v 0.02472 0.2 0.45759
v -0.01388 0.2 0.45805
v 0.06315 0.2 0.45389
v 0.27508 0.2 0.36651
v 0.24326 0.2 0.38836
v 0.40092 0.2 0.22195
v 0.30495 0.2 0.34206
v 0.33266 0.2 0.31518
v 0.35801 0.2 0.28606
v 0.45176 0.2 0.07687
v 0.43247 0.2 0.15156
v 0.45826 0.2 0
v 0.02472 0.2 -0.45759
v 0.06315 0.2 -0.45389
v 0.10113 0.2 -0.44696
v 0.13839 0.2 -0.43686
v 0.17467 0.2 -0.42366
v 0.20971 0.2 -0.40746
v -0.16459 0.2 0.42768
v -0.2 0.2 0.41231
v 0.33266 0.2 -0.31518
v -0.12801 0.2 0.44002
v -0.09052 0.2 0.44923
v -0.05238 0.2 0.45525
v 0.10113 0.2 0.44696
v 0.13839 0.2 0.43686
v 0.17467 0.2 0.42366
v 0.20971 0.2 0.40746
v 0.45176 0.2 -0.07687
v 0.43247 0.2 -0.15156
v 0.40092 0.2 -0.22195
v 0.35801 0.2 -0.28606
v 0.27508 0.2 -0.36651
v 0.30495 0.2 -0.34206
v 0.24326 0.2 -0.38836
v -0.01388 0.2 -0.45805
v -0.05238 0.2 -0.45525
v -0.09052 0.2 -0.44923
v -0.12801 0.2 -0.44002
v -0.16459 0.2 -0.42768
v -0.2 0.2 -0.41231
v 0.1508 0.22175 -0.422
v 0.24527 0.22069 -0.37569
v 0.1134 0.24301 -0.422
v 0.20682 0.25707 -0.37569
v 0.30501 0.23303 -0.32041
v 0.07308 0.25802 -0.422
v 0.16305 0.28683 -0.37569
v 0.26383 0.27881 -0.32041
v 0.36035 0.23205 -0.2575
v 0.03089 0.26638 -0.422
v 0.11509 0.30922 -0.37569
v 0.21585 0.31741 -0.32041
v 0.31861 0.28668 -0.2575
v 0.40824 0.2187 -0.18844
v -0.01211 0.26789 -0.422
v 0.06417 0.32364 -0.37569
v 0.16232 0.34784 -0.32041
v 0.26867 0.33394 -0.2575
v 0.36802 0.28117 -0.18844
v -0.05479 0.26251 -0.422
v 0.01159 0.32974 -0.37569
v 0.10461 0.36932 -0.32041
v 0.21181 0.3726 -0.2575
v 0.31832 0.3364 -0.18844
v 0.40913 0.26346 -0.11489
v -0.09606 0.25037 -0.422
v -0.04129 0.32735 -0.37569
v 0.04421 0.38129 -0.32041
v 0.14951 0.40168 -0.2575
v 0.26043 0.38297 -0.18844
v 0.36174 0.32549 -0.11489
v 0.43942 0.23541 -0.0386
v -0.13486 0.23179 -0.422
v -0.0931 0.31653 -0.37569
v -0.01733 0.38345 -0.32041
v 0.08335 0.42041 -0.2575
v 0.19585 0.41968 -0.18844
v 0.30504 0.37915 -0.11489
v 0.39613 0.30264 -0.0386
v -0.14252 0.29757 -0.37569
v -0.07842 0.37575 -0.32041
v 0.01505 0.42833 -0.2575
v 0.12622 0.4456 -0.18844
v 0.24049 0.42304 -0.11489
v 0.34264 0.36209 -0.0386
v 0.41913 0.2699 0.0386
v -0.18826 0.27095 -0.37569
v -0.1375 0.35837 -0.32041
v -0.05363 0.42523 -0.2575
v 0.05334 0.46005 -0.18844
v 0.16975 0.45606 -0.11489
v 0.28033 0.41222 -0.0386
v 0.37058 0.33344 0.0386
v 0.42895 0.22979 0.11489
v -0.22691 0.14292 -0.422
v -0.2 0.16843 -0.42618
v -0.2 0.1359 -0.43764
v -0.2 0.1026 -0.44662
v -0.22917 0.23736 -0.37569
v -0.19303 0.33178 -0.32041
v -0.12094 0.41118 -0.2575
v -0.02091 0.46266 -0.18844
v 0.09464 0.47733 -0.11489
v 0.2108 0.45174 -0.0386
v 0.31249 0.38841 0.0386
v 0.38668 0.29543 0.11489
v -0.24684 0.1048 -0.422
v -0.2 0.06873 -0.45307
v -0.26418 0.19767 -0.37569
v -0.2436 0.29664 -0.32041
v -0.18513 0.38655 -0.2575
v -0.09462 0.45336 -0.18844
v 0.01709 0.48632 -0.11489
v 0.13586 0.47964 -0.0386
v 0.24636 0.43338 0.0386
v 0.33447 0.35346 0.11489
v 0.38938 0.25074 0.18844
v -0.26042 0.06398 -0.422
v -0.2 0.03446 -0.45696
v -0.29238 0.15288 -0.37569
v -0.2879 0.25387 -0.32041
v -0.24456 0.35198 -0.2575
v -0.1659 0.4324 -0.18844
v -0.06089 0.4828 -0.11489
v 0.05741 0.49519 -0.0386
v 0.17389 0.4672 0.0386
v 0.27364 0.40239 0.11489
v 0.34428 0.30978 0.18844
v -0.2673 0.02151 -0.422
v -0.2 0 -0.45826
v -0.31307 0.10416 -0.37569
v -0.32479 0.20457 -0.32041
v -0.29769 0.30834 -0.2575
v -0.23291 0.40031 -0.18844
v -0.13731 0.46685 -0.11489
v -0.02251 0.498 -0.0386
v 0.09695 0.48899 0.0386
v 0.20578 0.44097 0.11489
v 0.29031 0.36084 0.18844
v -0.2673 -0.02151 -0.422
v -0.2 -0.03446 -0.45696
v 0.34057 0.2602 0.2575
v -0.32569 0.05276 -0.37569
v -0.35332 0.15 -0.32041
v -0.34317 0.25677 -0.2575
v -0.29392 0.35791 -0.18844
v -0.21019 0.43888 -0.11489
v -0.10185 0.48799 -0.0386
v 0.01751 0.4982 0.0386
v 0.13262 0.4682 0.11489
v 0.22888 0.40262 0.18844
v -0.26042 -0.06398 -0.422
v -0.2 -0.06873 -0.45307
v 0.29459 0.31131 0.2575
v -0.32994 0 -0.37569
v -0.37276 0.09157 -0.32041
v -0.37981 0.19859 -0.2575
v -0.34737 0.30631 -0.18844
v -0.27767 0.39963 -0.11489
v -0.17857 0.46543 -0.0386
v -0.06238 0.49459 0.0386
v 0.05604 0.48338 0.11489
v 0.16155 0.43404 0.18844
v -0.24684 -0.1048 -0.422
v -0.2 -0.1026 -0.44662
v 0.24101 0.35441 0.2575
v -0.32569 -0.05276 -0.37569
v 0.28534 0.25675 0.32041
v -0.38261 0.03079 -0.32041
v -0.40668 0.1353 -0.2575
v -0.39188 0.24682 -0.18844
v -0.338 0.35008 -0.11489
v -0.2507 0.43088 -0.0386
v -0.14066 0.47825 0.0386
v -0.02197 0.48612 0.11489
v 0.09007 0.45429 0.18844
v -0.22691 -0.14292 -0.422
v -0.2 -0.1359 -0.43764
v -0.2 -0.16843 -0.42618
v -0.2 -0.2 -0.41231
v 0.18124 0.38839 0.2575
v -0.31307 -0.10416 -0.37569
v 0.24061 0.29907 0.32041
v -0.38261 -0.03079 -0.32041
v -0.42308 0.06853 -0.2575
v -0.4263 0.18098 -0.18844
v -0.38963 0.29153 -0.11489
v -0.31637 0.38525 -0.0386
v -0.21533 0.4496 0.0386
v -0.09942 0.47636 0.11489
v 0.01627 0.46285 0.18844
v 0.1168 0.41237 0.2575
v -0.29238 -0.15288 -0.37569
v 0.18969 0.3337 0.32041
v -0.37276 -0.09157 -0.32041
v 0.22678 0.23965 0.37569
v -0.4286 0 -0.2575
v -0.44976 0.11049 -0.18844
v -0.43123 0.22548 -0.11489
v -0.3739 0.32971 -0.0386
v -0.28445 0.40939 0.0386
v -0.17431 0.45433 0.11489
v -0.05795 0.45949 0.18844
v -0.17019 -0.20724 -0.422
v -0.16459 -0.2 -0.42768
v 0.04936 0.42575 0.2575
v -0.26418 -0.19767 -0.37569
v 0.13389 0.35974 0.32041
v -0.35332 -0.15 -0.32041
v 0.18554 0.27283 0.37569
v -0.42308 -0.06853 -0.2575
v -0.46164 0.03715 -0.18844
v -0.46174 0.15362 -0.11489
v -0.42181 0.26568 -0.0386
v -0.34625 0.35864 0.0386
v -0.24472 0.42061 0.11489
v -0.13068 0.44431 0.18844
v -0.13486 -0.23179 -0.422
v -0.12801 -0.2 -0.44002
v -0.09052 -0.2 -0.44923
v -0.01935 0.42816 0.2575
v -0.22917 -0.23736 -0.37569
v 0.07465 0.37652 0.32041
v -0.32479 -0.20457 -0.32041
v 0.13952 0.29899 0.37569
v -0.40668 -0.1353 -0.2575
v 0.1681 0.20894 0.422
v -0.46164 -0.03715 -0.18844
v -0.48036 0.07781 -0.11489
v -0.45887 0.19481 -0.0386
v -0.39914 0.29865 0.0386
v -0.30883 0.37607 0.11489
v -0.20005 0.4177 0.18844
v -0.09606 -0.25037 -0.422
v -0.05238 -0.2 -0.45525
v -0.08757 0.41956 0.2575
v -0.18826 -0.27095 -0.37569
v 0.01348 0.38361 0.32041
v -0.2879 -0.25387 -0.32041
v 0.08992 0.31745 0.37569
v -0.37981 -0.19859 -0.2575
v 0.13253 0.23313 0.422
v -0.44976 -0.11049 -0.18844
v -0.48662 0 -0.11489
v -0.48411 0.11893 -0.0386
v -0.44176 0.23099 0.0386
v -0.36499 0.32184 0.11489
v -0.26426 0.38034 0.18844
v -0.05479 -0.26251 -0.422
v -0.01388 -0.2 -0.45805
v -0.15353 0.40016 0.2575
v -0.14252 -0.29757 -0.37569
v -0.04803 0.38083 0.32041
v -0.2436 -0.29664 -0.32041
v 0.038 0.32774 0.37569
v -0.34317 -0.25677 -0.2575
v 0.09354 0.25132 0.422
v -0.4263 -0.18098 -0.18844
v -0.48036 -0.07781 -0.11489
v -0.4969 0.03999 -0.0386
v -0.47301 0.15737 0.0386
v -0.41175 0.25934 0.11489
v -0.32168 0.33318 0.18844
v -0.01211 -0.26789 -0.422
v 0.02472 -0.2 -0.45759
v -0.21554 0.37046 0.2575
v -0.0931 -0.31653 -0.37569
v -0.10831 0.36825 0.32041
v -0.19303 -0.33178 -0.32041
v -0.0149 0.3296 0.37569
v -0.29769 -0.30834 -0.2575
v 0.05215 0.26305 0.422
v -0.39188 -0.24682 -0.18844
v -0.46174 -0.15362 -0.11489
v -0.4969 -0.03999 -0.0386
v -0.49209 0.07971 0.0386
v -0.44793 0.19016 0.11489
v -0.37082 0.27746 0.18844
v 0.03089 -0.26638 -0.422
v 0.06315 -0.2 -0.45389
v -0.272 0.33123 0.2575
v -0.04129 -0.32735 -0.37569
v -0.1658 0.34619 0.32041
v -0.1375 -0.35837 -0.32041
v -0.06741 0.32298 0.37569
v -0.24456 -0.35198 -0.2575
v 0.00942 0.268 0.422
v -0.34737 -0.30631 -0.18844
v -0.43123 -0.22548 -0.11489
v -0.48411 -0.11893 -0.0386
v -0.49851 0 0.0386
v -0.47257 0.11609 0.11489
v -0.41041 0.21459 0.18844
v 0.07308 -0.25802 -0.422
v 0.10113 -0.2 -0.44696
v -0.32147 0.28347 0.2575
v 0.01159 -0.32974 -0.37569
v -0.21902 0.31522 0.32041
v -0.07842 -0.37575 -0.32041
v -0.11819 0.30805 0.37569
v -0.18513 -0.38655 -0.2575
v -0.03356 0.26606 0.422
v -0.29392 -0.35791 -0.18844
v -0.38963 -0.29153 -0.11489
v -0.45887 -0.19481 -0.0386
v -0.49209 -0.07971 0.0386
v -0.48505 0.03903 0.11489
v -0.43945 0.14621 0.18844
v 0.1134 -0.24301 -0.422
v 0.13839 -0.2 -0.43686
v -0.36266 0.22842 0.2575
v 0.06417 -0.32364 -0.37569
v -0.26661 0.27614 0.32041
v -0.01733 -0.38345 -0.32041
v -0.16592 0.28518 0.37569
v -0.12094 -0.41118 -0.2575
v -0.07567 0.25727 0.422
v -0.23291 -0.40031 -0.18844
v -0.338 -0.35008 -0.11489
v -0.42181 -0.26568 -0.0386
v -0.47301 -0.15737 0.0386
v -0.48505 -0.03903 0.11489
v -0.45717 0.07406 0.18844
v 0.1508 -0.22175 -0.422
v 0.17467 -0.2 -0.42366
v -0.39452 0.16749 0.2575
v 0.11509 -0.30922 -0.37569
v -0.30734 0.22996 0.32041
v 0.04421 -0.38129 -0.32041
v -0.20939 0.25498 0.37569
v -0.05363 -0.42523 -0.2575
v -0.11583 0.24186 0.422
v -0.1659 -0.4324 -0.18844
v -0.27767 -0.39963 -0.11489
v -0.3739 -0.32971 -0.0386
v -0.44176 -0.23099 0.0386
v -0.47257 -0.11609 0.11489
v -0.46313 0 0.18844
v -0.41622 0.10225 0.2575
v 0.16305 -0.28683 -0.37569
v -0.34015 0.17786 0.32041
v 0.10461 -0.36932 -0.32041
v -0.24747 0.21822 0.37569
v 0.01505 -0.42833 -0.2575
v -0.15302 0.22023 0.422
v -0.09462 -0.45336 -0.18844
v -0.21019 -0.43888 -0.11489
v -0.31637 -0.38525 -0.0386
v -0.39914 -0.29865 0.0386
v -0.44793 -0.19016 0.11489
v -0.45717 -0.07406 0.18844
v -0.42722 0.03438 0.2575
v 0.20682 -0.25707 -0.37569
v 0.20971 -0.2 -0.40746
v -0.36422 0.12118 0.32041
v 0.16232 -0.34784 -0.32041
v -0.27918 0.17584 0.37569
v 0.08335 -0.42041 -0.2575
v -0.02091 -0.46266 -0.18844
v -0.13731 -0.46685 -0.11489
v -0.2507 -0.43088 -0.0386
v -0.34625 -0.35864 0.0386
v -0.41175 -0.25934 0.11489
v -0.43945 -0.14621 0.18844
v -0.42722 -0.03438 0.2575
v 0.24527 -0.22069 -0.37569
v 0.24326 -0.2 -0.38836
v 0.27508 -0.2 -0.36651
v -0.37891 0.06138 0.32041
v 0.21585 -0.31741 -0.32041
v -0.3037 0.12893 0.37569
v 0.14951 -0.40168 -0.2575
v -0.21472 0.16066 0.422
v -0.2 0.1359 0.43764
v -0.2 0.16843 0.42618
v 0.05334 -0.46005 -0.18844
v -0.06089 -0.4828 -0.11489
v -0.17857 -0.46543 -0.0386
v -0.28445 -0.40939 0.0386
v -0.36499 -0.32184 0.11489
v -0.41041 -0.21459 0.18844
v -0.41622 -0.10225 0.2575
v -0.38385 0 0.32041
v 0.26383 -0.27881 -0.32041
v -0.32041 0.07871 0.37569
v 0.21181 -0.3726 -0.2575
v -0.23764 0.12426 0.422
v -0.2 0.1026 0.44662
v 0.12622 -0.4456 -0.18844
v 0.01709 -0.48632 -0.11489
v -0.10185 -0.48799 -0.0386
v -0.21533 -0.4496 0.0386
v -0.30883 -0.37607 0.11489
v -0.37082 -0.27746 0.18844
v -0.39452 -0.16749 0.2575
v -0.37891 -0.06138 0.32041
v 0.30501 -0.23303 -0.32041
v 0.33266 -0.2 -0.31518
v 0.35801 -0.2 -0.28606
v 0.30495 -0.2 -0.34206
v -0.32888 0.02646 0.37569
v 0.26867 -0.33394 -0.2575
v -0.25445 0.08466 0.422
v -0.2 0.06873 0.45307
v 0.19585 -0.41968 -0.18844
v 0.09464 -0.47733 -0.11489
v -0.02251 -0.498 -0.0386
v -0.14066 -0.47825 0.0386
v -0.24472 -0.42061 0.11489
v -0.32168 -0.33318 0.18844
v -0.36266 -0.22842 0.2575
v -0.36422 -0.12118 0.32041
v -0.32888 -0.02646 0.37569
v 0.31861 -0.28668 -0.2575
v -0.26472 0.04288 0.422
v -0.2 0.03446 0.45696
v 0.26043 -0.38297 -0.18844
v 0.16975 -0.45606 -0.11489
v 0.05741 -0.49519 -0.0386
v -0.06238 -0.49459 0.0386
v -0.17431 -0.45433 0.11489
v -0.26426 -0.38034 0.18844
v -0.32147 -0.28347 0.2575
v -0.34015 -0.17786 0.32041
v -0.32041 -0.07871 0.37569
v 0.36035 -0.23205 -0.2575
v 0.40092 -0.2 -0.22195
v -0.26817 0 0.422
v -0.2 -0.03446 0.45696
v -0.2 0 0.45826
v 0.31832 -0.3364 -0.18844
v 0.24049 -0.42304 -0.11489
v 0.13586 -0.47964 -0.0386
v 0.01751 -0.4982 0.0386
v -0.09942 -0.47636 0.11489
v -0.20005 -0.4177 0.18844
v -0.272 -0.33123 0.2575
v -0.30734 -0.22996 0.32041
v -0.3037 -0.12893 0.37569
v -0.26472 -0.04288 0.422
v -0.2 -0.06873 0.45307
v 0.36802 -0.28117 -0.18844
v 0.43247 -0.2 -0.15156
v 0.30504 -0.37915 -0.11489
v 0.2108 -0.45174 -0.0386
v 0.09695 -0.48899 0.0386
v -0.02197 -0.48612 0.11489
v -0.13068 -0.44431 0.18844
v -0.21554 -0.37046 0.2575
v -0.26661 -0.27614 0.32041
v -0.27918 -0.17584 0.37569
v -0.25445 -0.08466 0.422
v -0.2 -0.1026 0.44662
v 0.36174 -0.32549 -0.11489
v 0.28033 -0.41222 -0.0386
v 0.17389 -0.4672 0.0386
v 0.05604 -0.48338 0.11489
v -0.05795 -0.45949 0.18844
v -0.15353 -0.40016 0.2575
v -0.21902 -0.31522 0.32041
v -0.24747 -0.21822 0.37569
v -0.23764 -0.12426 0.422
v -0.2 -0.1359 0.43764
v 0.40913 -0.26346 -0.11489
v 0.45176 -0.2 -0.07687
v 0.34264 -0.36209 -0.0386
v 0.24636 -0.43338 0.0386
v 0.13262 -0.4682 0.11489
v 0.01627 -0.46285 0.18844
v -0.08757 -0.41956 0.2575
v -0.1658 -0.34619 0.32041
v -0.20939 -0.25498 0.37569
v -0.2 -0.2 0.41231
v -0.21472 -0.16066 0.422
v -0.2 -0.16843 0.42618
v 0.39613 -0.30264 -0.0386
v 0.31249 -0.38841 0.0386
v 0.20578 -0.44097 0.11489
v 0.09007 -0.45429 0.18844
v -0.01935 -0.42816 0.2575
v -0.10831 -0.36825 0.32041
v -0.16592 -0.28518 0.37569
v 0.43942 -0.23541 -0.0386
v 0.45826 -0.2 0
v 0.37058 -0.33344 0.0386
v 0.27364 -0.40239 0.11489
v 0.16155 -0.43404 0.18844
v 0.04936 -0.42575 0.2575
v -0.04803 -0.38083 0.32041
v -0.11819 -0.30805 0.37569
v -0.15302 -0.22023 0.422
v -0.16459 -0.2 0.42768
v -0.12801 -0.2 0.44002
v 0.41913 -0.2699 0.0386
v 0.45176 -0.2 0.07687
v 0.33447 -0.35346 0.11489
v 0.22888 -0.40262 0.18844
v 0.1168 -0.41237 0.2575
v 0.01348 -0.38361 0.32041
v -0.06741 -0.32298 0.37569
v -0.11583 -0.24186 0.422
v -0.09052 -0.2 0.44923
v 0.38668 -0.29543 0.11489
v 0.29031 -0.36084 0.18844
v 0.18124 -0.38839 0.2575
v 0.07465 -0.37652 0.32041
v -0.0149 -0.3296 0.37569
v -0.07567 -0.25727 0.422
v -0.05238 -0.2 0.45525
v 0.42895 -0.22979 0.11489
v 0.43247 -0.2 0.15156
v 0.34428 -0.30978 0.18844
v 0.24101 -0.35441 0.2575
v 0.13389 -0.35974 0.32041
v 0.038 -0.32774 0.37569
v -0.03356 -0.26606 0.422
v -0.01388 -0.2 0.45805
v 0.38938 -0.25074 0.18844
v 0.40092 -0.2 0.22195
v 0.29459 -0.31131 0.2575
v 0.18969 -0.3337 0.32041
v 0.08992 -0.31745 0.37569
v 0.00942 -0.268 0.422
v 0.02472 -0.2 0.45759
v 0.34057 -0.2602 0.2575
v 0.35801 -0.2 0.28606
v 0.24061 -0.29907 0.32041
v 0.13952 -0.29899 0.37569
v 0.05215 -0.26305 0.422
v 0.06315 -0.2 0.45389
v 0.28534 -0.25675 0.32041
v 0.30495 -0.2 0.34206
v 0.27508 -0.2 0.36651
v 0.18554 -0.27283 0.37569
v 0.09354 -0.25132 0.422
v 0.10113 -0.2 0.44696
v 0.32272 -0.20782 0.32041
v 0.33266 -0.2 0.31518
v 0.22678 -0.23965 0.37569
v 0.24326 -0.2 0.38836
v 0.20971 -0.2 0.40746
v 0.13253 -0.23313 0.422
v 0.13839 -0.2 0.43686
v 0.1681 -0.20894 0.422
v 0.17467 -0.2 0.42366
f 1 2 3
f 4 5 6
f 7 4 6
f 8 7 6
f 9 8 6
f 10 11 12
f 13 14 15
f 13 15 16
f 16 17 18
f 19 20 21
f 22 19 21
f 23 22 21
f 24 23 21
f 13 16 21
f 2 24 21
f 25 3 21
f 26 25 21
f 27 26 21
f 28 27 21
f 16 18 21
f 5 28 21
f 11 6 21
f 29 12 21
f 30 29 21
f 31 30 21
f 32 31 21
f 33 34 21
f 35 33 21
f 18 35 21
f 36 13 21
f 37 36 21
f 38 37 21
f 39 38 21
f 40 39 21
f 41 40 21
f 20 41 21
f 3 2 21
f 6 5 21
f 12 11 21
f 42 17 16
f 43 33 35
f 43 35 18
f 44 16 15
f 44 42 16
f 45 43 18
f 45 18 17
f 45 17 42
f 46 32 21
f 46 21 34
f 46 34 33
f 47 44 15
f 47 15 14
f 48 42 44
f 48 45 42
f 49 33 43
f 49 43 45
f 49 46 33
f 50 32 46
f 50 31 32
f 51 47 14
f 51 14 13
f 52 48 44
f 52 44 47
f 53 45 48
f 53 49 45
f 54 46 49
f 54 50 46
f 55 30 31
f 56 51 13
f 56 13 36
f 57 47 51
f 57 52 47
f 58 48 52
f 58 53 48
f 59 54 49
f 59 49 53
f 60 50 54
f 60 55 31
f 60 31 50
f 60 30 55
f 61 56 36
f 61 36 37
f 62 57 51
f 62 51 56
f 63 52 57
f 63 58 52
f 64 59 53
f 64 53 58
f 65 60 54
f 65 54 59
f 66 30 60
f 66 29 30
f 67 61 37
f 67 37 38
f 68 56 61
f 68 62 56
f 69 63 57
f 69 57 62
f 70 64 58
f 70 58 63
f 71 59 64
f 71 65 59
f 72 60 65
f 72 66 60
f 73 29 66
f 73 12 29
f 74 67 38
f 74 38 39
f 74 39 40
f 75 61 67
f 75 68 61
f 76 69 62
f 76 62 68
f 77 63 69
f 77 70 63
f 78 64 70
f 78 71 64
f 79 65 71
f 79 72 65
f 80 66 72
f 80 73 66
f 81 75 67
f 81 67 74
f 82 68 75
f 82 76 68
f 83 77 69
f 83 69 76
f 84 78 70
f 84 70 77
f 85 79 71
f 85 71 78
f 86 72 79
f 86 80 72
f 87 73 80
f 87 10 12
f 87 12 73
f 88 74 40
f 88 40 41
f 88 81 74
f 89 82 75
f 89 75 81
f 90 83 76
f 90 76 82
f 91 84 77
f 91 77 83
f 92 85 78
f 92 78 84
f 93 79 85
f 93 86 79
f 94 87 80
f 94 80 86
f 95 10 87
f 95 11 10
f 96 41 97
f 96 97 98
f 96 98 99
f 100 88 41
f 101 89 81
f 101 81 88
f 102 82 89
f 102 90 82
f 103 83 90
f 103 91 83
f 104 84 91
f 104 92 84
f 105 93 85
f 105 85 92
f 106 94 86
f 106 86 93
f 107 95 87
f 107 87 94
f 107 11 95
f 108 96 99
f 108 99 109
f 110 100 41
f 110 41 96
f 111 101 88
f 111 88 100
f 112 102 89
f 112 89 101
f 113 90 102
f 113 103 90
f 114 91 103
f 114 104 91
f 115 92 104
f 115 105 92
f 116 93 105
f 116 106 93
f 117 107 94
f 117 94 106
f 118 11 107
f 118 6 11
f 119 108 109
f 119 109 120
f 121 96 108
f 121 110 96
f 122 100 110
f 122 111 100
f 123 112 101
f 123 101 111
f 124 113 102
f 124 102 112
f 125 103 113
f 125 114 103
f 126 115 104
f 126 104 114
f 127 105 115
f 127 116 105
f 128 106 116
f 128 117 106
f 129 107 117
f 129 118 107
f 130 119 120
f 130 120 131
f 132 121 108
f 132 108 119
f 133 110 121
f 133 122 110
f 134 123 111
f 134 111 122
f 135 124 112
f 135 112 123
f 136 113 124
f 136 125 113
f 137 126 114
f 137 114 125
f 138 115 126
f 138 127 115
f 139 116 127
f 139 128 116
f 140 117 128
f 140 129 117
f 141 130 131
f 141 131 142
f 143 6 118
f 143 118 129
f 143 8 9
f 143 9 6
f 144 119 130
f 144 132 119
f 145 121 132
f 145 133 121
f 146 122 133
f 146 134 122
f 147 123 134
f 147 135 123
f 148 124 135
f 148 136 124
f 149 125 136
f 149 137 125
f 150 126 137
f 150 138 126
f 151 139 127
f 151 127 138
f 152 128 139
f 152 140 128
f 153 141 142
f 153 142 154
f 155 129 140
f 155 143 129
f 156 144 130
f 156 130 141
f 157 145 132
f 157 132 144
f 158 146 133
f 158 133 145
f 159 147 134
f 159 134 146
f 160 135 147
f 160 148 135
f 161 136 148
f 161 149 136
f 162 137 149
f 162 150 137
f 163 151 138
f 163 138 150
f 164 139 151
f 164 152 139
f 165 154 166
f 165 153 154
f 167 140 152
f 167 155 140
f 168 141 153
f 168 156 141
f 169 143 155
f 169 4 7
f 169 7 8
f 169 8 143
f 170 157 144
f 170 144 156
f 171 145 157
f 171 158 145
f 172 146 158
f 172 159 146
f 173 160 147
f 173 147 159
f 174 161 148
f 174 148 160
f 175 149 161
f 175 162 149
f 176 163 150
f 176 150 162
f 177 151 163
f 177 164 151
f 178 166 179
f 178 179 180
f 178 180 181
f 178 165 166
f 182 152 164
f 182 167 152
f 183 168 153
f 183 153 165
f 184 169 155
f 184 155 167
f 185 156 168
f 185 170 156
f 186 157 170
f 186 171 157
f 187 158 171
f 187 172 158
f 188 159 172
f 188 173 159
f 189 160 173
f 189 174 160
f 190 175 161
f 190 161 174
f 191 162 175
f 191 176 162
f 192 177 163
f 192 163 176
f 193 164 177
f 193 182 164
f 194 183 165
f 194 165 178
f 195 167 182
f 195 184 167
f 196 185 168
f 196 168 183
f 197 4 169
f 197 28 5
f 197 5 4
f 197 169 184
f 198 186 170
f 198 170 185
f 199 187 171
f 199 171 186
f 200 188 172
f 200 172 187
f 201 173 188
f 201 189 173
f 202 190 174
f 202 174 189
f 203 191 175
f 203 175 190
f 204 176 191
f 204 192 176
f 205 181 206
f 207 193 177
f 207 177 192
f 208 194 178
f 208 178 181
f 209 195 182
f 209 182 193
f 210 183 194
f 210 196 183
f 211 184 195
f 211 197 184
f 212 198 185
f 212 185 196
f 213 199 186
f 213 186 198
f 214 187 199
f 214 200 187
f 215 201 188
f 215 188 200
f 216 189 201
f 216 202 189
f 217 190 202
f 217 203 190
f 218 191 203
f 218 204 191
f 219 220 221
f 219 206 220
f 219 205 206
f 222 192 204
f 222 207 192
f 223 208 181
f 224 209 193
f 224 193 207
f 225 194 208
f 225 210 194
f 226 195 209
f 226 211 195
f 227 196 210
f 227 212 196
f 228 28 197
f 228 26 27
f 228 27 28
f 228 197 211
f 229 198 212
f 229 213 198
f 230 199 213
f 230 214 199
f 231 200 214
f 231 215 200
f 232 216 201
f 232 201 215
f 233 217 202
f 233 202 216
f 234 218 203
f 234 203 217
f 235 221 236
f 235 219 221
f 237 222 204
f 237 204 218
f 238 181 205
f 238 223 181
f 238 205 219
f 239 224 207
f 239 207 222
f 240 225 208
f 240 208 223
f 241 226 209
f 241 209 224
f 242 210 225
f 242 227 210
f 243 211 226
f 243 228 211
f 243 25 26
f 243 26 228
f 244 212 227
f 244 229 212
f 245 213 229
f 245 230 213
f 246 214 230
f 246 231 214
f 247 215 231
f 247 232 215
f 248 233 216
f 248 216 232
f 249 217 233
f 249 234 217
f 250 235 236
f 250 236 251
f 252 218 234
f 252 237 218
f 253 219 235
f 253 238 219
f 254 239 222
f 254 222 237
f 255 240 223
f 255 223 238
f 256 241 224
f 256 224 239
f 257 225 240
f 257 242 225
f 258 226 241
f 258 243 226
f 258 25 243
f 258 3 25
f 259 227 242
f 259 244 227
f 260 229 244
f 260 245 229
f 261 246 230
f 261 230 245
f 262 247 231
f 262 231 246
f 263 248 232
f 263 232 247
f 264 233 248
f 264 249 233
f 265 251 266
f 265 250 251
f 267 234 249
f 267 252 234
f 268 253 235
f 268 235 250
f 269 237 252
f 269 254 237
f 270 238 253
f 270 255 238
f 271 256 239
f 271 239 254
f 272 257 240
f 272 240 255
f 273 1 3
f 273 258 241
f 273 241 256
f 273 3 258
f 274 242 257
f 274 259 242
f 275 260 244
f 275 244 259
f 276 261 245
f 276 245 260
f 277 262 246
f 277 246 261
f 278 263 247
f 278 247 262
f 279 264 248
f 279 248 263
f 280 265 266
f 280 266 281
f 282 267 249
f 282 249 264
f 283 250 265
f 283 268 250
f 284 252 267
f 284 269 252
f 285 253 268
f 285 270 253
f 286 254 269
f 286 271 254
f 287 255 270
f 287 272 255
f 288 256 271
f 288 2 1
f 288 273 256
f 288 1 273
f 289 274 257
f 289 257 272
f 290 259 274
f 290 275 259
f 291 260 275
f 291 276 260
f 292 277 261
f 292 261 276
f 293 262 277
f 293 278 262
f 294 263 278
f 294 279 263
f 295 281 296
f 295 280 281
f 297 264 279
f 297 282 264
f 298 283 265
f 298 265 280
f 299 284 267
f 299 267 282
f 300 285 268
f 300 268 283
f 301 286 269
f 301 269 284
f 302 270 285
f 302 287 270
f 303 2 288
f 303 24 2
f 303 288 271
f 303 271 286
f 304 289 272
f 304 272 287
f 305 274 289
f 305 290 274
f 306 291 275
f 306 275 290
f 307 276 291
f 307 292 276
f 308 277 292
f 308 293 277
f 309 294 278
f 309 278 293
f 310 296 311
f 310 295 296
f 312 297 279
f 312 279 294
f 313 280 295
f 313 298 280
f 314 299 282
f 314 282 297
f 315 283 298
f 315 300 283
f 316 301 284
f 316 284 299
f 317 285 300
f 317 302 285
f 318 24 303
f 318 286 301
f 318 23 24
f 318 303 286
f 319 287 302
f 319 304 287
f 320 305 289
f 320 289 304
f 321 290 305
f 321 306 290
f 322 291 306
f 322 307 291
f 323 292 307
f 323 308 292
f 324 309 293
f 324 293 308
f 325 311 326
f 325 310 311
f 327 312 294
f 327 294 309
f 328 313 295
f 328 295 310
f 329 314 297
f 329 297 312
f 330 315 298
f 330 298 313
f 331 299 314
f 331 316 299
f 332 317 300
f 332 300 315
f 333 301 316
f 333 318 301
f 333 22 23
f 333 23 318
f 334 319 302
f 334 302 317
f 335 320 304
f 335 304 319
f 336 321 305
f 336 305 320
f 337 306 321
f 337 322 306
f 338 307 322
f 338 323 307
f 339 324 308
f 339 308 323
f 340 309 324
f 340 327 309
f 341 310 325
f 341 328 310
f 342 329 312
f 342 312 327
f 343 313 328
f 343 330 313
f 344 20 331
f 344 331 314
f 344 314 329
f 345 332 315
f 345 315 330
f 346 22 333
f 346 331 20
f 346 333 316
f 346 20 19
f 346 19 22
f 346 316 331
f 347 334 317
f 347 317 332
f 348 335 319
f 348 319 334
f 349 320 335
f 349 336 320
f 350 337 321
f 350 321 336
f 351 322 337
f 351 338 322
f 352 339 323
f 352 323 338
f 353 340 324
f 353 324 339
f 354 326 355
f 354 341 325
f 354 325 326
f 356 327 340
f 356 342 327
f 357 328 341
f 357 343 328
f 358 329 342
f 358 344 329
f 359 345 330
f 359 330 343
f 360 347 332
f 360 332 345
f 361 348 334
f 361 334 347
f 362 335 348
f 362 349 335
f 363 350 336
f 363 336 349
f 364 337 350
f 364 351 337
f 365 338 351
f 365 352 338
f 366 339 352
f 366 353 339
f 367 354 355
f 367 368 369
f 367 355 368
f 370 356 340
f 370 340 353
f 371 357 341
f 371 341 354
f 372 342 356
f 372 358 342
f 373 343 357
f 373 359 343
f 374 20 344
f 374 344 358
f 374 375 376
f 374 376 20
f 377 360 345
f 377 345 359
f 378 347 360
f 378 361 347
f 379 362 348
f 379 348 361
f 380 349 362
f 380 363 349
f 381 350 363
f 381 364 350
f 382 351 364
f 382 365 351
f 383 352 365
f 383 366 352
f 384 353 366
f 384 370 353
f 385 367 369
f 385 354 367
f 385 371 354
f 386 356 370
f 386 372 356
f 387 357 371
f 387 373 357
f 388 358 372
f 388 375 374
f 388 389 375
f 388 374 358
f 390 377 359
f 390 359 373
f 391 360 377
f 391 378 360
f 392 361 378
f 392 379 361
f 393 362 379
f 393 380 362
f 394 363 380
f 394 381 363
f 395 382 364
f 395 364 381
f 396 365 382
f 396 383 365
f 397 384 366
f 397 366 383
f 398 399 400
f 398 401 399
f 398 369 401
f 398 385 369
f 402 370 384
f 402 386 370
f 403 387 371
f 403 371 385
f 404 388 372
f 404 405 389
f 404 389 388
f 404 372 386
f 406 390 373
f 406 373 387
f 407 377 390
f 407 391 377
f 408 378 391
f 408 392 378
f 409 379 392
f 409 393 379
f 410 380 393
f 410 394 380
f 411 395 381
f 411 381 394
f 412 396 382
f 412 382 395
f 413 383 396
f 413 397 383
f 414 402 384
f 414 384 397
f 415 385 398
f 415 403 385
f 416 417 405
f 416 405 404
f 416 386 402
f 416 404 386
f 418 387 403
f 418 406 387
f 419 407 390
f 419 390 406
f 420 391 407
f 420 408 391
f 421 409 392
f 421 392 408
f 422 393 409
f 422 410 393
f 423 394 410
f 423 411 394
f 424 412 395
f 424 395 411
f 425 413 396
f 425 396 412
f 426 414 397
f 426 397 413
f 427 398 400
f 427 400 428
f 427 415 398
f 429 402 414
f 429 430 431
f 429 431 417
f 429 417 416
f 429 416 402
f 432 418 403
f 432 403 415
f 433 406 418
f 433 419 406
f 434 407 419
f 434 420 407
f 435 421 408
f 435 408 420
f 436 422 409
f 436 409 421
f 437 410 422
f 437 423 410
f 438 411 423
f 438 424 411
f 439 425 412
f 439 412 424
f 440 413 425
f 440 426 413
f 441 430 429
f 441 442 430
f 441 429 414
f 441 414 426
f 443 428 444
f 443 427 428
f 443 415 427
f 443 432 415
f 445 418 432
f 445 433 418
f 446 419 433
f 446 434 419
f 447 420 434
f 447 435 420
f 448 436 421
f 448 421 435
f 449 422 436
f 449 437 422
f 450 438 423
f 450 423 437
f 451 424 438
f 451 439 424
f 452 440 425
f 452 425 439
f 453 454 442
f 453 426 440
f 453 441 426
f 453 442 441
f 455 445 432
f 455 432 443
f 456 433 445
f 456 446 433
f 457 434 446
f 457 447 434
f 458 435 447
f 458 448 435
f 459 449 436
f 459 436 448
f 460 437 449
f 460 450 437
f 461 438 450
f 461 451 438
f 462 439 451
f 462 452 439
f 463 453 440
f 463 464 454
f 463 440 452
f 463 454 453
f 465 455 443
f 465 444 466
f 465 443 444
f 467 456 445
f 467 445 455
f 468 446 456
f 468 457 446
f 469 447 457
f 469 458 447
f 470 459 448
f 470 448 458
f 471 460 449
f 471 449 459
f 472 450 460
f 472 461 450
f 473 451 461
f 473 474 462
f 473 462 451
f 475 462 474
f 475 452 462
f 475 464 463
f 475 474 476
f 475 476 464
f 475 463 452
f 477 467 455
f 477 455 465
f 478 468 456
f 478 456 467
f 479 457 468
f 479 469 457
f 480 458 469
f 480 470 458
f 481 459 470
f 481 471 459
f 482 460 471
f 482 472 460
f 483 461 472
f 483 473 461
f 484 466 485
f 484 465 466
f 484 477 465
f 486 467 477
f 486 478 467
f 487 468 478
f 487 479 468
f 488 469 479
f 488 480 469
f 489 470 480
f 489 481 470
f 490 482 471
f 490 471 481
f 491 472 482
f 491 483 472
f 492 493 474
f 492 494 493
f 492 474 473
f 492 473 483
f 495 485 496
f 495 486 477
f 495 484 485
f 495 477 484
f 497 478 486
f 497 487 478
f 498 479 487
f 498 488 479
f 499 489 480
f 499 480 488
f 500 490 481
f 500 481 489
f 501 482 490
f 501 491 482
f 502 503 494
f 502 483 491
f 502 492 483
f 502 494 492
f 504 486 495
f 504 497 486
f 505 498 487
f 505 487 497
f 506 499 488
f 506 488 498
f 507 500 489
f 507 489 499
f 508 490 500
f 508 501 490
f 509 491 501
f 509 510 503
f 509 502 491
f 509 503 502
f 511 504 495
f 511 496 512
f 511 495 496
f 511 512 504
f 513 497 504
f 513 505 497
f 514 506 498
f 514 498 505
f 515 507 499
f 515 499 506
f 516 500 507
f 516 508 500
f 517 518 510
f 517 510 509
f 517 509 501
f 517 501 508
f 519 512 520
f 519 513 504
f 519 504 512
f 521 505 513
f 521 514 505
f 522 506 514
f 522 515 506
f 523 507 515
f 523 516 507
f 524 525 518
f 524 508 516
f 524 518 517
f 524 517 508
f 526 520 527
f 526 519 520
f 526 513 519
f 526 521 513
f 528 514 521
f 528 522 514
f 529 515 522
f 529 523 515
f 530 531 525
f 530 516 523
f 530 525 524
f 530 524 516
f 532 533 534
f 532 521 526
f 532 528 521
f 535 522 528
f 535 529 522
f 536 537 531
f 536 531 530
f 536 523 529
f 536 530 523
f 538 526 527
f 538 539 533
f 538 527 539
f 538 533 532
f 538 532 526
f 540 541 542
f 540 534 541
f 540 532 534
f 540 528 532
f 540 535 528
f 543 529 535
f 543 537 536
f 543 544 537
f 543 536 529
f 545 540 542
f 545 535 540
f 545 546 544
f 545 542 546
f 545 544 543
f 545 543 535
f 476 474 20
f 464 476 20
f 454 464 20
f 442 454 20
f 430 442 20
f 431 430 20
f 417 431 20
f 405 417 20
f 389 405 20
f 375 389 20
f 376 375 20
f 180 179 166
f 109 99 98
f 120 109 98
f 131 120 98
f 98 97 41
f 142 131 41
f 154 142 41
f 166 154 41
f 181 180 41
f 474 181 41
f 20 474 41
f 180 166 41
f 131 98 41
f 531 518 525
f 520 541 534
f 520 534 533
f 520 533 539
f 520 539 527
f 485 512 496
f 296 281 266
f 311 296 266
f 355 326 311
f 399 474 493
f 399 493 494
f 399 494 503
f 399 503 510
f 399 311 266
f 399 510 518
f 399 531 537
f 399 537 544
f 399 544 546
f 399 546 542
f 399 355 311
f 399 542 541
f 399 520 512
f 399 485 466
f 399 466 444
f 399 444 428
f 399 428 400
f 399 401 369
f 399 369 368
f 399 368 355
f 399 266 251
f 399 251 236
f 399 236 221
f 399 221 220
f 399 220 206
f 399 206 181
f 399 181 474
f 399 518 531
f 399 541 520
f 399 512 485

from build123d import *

# Parameters (mm, degrees)
BOX_W     = 5
BOX_H     = 0.4
BOX_DEPTH = 5


with BuildPart() as box:
    # Box → Box (new body)
    with BuildSketch(Plane(origin=(-0.2, -0.2, -1), x_dir=(1, 0, 0), z_dir=(0, 0, 1))):
        with Locations((2.5, 0.2)):
            Rectangle(BOX_W, BOX_H)
    extrude(amount=BOX_DEPTH)


with BuildPart() as cut:
    # Sphere → Sphere (revolve)
    with BuildSketch(Plane.XZ):
        with BuildLine():
            ThreePointArc((0, -0.5), (0.5, 0), (0, 0.5))
            Line((0, 0.5), (0, -0.5))
        make_face()
    revolve(axis=Axis((0, 0, 0), (0, 0, 1)))

    # Cut: cut Box
    add(box.part, mode=Mode.SUBTRACT)


solid = cut.part
